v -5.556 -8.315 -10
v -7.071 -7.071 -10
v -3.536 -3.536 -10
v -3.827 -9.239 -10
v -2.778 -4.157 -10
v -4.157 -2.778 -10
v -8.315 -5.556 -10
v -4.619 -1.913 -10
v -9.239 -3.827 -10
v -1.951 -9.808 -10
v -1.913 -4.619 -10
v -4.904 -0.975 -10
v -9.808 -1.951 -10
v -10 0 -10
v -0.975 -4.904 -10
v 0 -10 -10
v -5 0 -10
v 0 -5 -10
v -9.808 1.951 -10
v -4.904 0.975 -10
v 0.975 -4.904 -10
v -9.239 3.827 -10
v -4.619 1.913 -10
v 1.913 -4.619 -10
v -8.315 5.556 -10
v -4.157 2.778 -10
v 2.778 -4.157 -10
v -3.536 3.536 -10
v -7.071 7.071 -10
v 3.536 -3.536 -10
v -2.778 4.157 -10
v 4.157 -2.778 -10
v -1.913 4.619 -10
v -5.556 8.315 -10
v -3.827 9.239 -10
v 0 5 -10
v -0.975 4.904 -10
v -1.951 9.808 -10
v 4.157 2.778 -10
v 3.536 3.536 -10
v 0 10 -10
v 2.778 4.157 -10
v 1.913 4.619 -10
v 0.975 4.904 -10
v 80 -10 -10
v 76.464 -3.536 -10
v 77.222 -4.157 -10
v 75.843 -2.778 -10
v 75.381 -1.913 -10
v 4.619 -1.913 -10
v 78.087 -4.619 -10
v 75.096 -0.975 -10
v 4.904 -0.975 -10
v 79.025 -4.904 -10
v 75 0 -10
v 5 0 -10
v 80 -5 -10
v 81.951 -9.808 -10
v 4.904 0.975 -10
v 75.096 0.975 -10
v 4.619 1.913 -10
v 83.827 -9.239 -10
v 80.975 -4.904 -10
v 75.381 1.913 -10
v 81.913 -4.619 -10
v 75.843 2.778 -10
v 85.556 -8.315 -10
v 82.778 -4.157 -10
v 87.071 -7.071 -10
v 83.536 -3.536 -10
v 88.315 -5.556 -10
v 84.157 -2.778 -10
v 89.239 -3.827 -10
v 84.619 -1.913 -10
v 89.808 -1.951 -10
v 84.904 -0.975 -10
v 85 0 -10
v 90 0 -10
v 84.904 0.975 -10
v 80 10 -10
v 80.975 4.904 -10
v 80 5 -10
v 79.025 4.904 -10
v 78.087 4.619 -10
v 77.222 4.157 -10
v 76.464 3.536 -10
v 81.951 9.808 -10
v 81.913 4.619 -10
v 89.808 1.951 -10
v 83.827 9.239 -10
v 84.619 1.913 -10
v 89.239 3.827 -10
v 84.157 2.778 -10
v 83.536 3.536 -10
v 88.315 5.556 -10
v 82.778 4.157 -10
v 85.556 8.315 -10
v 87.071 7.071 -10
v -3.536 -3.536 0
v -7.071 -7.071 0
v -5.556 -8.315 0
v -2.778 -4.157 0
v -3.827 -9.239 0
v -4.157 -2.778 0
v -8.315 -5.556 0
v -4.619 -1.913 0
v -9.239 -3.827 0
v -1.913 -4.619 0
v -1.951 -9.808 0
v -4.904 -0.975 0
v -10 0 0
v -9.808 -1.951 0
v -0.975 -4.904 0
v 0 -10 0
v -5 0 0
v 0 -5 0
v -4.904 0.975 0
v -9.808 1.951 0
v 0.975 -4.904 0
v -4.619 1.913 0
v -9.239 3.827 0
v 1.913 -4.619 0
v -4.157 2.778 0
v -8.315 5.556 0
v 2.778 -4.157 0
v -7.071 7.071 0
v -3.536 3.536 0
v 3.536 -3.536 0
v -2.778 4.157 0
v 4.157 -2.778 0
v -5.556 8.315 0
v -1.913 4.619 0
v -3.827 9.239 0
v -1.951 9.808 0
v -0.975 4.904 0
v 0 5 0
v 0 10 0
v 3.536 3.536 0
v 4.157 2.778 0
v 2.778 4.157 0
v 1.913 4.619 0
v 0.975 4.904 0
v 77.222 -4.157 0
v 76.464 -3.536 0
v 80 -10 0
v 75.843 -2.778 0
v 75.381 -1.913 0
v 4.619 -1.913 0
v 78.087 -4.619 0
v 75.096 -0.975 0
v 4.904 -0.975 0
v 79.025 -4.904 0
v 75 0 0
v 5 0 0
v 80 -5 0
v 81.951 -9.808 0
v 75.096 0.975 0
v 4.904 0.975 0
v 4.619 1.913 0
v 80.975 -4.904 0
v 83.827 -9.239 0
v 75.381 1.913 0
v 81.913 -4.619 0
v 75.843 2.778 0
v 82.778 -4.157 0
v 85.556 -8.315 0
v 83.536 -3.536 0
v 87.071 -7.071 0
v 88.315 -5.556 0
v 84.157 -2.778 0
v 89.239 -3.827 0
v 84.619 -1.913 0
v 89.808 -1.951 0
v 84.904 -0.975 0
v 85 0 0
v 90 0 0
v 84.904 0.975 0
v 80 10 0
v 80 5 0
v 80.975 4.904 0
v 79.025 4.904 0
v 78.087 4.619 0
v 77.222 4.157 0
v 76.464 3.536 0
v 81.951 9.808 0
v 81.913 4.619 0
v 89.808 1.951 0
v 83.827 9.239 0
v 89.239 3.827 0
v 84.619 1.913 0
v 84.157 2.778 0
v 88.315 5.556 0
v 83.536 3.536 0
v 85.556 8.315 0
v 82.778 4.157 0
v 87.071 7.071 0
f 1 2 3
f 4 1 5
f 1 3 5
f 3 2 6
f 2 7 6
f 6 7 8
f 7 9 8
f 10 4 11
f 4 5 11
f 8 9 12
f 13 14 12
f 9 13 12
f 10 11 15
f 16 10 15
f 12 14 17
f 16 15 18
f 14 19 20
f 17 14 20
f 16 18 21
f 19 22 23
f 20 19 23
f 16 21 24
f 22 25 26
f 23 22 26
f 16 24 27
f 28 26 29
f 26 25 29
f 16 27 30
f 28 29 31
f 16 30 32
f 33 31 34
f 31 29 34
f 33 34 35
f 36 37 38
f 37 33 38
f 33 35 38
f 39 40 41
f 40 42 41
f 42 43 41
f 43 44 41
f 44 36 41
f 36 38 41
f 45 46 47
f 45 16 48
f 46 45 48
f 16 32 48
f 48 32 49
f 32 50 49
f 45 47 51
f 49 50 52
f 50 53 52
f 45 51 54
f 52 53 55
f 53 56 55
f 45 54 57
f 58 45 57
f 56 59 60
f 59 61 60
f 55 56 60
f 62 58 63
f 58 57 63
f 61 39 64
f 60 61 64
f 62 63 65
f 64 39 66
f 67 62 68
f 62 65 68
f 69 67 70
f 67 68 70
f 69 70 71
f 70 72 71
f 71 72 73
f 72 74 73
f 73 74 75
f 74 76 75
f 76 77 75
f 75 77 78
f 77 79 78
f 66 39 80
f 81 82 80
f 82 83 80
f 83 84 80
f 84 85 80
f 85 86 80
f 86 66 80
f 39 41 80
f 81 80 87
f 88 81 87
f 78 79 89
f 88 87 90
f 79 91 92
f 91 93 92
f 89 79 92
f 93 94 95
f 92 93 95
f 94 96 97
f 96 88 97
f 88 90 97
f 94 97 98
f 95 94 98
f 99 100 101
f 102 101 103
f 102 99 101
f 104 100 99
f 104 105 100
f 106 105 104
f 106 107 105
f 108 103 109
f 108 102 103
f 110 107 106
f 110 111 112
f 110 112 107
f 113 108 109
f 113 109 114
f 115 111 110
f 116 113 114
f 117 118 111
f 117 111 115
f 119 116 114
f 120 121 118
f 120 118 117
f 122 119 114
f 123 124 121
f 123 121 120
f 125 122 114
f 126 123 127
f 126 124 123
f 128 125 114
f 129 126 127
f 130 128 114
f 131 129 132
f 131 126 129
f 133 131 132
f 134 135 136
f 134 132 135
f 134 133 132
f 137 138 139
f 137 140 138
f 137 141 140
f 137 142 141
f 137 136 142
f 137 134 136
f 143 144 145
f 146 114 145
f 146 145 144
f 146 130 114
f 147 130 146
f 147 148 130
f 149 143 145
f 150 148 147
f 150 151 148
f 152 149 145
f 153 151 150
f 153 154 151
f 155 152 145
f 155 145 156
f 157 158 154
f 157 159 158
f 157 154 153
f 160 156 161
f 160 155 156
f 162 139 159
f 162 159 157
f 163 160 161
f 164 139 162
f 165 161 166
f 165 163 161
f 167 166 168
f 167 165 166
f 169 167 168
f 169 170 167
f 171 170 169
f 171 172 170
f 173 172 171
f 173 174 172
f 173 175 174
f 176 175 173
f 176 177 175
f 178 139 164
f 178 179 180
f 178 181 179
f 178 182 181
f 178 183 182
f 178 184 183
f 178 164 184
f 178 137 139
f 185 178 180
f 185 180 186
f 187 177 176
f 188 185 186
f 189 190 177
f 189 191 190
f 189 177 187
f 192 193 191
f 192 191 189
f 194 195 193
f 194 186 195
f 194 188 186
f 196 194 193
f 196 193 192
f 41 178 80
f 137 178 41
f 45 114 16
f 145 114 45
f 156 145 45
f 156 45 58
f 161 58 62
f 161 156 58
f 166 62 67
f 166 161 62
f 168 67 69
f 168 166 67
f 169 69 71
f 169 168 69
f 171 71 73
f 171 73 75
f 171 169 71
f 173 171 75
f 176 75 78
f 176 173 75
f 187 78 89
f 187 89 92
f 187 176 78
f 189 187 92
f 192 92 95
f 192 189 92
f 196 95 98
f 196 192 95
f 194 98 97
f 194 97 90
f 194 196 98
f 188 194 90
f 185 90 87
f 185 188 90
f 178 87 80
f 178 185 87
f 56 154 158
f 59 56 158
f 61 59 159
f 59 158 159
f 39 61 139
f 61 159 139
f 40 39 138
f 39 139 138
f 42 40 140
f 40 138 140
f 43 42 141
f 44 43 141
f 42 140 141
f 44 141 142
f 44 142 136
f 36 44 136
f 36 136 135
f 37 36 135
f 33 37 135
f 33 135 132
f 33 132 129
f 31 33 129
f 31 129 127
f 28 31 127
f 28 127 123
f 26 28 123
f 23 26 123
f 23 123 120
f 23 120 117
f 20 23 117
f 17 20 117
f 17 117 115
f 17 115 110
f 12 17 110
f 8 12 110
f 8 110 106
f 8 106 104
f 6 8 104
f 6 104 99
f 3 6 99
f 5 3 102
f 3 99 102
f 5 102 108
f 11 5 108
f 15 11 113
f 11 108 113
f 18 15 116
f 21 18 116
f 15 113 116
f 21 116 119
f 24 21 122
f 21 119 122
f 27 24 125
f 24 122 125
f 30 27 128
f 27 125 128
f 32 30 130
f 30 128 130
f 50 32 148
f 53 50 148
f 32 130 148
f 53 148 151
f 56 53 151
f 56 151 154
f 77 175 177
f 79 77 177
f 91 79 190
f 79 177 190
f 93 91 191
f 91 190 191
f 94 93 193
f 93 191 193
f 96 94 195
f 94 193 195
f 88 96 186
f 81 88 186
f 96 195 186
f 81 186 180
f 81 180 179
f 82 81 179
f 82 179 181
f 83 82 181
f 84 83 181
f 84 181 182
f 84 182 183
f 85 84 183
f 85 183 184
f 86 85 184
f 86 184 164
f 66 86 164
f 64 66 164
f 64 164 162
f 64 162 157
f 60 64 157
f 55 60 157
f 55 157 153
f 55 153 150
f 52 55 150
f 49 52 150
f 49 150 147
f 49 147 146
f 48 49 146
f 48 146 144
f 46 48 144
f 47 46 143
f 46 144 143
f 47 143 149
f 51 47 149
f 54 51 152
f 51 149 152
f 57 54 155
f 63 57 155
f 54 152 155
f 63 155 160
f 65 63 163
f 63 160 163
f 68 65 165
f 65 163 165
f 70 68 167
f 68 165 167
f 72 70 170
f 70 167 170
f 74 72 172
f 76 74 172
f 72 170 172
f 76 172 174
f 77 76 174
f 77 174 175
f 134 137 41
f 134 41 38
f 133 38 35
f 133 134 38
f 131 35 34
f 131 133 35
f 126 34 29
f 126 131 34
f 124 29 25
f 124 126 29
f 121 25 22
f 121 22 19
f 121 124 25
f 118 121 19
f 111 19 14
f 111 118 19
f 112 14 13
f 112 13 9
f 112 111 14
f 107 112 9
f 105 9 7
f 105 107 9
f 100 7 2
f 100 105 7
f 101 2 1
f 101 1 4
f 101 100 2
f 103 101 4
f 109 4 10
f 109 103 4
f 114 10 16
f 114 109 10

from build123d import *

# Parameters (mm, degrees)
F1_DEPTH = 10
F2_R     = 5
F3_DEPTH = 10.001


with BuildPart() as f1:
    # F0 (on Top) → F1 (new body)
    with BuildSketch(Plane.XY):
        with BuildLine():
            Line((80, 10), (0, 10))
            ThreePointArc((0, 10), (-10, 0), (0, -10))
            Line((0, -10), (80, -10))
            ThreePointArc((80, -10), (90, 0), (80, 10))
        make_face()
    extrude(amount=-F1_DEPTH)

    # F2 (on face) → F3 (cut, through all)
    with BuildSketch(Plane.XY):
        Circle(F2_R)
        with Locations((80, 0)):
            Circle(F2_R)
    extrude(amount=-F3_DEPTH, mode=Mode.SUBTRACT)


solid = f1.part
